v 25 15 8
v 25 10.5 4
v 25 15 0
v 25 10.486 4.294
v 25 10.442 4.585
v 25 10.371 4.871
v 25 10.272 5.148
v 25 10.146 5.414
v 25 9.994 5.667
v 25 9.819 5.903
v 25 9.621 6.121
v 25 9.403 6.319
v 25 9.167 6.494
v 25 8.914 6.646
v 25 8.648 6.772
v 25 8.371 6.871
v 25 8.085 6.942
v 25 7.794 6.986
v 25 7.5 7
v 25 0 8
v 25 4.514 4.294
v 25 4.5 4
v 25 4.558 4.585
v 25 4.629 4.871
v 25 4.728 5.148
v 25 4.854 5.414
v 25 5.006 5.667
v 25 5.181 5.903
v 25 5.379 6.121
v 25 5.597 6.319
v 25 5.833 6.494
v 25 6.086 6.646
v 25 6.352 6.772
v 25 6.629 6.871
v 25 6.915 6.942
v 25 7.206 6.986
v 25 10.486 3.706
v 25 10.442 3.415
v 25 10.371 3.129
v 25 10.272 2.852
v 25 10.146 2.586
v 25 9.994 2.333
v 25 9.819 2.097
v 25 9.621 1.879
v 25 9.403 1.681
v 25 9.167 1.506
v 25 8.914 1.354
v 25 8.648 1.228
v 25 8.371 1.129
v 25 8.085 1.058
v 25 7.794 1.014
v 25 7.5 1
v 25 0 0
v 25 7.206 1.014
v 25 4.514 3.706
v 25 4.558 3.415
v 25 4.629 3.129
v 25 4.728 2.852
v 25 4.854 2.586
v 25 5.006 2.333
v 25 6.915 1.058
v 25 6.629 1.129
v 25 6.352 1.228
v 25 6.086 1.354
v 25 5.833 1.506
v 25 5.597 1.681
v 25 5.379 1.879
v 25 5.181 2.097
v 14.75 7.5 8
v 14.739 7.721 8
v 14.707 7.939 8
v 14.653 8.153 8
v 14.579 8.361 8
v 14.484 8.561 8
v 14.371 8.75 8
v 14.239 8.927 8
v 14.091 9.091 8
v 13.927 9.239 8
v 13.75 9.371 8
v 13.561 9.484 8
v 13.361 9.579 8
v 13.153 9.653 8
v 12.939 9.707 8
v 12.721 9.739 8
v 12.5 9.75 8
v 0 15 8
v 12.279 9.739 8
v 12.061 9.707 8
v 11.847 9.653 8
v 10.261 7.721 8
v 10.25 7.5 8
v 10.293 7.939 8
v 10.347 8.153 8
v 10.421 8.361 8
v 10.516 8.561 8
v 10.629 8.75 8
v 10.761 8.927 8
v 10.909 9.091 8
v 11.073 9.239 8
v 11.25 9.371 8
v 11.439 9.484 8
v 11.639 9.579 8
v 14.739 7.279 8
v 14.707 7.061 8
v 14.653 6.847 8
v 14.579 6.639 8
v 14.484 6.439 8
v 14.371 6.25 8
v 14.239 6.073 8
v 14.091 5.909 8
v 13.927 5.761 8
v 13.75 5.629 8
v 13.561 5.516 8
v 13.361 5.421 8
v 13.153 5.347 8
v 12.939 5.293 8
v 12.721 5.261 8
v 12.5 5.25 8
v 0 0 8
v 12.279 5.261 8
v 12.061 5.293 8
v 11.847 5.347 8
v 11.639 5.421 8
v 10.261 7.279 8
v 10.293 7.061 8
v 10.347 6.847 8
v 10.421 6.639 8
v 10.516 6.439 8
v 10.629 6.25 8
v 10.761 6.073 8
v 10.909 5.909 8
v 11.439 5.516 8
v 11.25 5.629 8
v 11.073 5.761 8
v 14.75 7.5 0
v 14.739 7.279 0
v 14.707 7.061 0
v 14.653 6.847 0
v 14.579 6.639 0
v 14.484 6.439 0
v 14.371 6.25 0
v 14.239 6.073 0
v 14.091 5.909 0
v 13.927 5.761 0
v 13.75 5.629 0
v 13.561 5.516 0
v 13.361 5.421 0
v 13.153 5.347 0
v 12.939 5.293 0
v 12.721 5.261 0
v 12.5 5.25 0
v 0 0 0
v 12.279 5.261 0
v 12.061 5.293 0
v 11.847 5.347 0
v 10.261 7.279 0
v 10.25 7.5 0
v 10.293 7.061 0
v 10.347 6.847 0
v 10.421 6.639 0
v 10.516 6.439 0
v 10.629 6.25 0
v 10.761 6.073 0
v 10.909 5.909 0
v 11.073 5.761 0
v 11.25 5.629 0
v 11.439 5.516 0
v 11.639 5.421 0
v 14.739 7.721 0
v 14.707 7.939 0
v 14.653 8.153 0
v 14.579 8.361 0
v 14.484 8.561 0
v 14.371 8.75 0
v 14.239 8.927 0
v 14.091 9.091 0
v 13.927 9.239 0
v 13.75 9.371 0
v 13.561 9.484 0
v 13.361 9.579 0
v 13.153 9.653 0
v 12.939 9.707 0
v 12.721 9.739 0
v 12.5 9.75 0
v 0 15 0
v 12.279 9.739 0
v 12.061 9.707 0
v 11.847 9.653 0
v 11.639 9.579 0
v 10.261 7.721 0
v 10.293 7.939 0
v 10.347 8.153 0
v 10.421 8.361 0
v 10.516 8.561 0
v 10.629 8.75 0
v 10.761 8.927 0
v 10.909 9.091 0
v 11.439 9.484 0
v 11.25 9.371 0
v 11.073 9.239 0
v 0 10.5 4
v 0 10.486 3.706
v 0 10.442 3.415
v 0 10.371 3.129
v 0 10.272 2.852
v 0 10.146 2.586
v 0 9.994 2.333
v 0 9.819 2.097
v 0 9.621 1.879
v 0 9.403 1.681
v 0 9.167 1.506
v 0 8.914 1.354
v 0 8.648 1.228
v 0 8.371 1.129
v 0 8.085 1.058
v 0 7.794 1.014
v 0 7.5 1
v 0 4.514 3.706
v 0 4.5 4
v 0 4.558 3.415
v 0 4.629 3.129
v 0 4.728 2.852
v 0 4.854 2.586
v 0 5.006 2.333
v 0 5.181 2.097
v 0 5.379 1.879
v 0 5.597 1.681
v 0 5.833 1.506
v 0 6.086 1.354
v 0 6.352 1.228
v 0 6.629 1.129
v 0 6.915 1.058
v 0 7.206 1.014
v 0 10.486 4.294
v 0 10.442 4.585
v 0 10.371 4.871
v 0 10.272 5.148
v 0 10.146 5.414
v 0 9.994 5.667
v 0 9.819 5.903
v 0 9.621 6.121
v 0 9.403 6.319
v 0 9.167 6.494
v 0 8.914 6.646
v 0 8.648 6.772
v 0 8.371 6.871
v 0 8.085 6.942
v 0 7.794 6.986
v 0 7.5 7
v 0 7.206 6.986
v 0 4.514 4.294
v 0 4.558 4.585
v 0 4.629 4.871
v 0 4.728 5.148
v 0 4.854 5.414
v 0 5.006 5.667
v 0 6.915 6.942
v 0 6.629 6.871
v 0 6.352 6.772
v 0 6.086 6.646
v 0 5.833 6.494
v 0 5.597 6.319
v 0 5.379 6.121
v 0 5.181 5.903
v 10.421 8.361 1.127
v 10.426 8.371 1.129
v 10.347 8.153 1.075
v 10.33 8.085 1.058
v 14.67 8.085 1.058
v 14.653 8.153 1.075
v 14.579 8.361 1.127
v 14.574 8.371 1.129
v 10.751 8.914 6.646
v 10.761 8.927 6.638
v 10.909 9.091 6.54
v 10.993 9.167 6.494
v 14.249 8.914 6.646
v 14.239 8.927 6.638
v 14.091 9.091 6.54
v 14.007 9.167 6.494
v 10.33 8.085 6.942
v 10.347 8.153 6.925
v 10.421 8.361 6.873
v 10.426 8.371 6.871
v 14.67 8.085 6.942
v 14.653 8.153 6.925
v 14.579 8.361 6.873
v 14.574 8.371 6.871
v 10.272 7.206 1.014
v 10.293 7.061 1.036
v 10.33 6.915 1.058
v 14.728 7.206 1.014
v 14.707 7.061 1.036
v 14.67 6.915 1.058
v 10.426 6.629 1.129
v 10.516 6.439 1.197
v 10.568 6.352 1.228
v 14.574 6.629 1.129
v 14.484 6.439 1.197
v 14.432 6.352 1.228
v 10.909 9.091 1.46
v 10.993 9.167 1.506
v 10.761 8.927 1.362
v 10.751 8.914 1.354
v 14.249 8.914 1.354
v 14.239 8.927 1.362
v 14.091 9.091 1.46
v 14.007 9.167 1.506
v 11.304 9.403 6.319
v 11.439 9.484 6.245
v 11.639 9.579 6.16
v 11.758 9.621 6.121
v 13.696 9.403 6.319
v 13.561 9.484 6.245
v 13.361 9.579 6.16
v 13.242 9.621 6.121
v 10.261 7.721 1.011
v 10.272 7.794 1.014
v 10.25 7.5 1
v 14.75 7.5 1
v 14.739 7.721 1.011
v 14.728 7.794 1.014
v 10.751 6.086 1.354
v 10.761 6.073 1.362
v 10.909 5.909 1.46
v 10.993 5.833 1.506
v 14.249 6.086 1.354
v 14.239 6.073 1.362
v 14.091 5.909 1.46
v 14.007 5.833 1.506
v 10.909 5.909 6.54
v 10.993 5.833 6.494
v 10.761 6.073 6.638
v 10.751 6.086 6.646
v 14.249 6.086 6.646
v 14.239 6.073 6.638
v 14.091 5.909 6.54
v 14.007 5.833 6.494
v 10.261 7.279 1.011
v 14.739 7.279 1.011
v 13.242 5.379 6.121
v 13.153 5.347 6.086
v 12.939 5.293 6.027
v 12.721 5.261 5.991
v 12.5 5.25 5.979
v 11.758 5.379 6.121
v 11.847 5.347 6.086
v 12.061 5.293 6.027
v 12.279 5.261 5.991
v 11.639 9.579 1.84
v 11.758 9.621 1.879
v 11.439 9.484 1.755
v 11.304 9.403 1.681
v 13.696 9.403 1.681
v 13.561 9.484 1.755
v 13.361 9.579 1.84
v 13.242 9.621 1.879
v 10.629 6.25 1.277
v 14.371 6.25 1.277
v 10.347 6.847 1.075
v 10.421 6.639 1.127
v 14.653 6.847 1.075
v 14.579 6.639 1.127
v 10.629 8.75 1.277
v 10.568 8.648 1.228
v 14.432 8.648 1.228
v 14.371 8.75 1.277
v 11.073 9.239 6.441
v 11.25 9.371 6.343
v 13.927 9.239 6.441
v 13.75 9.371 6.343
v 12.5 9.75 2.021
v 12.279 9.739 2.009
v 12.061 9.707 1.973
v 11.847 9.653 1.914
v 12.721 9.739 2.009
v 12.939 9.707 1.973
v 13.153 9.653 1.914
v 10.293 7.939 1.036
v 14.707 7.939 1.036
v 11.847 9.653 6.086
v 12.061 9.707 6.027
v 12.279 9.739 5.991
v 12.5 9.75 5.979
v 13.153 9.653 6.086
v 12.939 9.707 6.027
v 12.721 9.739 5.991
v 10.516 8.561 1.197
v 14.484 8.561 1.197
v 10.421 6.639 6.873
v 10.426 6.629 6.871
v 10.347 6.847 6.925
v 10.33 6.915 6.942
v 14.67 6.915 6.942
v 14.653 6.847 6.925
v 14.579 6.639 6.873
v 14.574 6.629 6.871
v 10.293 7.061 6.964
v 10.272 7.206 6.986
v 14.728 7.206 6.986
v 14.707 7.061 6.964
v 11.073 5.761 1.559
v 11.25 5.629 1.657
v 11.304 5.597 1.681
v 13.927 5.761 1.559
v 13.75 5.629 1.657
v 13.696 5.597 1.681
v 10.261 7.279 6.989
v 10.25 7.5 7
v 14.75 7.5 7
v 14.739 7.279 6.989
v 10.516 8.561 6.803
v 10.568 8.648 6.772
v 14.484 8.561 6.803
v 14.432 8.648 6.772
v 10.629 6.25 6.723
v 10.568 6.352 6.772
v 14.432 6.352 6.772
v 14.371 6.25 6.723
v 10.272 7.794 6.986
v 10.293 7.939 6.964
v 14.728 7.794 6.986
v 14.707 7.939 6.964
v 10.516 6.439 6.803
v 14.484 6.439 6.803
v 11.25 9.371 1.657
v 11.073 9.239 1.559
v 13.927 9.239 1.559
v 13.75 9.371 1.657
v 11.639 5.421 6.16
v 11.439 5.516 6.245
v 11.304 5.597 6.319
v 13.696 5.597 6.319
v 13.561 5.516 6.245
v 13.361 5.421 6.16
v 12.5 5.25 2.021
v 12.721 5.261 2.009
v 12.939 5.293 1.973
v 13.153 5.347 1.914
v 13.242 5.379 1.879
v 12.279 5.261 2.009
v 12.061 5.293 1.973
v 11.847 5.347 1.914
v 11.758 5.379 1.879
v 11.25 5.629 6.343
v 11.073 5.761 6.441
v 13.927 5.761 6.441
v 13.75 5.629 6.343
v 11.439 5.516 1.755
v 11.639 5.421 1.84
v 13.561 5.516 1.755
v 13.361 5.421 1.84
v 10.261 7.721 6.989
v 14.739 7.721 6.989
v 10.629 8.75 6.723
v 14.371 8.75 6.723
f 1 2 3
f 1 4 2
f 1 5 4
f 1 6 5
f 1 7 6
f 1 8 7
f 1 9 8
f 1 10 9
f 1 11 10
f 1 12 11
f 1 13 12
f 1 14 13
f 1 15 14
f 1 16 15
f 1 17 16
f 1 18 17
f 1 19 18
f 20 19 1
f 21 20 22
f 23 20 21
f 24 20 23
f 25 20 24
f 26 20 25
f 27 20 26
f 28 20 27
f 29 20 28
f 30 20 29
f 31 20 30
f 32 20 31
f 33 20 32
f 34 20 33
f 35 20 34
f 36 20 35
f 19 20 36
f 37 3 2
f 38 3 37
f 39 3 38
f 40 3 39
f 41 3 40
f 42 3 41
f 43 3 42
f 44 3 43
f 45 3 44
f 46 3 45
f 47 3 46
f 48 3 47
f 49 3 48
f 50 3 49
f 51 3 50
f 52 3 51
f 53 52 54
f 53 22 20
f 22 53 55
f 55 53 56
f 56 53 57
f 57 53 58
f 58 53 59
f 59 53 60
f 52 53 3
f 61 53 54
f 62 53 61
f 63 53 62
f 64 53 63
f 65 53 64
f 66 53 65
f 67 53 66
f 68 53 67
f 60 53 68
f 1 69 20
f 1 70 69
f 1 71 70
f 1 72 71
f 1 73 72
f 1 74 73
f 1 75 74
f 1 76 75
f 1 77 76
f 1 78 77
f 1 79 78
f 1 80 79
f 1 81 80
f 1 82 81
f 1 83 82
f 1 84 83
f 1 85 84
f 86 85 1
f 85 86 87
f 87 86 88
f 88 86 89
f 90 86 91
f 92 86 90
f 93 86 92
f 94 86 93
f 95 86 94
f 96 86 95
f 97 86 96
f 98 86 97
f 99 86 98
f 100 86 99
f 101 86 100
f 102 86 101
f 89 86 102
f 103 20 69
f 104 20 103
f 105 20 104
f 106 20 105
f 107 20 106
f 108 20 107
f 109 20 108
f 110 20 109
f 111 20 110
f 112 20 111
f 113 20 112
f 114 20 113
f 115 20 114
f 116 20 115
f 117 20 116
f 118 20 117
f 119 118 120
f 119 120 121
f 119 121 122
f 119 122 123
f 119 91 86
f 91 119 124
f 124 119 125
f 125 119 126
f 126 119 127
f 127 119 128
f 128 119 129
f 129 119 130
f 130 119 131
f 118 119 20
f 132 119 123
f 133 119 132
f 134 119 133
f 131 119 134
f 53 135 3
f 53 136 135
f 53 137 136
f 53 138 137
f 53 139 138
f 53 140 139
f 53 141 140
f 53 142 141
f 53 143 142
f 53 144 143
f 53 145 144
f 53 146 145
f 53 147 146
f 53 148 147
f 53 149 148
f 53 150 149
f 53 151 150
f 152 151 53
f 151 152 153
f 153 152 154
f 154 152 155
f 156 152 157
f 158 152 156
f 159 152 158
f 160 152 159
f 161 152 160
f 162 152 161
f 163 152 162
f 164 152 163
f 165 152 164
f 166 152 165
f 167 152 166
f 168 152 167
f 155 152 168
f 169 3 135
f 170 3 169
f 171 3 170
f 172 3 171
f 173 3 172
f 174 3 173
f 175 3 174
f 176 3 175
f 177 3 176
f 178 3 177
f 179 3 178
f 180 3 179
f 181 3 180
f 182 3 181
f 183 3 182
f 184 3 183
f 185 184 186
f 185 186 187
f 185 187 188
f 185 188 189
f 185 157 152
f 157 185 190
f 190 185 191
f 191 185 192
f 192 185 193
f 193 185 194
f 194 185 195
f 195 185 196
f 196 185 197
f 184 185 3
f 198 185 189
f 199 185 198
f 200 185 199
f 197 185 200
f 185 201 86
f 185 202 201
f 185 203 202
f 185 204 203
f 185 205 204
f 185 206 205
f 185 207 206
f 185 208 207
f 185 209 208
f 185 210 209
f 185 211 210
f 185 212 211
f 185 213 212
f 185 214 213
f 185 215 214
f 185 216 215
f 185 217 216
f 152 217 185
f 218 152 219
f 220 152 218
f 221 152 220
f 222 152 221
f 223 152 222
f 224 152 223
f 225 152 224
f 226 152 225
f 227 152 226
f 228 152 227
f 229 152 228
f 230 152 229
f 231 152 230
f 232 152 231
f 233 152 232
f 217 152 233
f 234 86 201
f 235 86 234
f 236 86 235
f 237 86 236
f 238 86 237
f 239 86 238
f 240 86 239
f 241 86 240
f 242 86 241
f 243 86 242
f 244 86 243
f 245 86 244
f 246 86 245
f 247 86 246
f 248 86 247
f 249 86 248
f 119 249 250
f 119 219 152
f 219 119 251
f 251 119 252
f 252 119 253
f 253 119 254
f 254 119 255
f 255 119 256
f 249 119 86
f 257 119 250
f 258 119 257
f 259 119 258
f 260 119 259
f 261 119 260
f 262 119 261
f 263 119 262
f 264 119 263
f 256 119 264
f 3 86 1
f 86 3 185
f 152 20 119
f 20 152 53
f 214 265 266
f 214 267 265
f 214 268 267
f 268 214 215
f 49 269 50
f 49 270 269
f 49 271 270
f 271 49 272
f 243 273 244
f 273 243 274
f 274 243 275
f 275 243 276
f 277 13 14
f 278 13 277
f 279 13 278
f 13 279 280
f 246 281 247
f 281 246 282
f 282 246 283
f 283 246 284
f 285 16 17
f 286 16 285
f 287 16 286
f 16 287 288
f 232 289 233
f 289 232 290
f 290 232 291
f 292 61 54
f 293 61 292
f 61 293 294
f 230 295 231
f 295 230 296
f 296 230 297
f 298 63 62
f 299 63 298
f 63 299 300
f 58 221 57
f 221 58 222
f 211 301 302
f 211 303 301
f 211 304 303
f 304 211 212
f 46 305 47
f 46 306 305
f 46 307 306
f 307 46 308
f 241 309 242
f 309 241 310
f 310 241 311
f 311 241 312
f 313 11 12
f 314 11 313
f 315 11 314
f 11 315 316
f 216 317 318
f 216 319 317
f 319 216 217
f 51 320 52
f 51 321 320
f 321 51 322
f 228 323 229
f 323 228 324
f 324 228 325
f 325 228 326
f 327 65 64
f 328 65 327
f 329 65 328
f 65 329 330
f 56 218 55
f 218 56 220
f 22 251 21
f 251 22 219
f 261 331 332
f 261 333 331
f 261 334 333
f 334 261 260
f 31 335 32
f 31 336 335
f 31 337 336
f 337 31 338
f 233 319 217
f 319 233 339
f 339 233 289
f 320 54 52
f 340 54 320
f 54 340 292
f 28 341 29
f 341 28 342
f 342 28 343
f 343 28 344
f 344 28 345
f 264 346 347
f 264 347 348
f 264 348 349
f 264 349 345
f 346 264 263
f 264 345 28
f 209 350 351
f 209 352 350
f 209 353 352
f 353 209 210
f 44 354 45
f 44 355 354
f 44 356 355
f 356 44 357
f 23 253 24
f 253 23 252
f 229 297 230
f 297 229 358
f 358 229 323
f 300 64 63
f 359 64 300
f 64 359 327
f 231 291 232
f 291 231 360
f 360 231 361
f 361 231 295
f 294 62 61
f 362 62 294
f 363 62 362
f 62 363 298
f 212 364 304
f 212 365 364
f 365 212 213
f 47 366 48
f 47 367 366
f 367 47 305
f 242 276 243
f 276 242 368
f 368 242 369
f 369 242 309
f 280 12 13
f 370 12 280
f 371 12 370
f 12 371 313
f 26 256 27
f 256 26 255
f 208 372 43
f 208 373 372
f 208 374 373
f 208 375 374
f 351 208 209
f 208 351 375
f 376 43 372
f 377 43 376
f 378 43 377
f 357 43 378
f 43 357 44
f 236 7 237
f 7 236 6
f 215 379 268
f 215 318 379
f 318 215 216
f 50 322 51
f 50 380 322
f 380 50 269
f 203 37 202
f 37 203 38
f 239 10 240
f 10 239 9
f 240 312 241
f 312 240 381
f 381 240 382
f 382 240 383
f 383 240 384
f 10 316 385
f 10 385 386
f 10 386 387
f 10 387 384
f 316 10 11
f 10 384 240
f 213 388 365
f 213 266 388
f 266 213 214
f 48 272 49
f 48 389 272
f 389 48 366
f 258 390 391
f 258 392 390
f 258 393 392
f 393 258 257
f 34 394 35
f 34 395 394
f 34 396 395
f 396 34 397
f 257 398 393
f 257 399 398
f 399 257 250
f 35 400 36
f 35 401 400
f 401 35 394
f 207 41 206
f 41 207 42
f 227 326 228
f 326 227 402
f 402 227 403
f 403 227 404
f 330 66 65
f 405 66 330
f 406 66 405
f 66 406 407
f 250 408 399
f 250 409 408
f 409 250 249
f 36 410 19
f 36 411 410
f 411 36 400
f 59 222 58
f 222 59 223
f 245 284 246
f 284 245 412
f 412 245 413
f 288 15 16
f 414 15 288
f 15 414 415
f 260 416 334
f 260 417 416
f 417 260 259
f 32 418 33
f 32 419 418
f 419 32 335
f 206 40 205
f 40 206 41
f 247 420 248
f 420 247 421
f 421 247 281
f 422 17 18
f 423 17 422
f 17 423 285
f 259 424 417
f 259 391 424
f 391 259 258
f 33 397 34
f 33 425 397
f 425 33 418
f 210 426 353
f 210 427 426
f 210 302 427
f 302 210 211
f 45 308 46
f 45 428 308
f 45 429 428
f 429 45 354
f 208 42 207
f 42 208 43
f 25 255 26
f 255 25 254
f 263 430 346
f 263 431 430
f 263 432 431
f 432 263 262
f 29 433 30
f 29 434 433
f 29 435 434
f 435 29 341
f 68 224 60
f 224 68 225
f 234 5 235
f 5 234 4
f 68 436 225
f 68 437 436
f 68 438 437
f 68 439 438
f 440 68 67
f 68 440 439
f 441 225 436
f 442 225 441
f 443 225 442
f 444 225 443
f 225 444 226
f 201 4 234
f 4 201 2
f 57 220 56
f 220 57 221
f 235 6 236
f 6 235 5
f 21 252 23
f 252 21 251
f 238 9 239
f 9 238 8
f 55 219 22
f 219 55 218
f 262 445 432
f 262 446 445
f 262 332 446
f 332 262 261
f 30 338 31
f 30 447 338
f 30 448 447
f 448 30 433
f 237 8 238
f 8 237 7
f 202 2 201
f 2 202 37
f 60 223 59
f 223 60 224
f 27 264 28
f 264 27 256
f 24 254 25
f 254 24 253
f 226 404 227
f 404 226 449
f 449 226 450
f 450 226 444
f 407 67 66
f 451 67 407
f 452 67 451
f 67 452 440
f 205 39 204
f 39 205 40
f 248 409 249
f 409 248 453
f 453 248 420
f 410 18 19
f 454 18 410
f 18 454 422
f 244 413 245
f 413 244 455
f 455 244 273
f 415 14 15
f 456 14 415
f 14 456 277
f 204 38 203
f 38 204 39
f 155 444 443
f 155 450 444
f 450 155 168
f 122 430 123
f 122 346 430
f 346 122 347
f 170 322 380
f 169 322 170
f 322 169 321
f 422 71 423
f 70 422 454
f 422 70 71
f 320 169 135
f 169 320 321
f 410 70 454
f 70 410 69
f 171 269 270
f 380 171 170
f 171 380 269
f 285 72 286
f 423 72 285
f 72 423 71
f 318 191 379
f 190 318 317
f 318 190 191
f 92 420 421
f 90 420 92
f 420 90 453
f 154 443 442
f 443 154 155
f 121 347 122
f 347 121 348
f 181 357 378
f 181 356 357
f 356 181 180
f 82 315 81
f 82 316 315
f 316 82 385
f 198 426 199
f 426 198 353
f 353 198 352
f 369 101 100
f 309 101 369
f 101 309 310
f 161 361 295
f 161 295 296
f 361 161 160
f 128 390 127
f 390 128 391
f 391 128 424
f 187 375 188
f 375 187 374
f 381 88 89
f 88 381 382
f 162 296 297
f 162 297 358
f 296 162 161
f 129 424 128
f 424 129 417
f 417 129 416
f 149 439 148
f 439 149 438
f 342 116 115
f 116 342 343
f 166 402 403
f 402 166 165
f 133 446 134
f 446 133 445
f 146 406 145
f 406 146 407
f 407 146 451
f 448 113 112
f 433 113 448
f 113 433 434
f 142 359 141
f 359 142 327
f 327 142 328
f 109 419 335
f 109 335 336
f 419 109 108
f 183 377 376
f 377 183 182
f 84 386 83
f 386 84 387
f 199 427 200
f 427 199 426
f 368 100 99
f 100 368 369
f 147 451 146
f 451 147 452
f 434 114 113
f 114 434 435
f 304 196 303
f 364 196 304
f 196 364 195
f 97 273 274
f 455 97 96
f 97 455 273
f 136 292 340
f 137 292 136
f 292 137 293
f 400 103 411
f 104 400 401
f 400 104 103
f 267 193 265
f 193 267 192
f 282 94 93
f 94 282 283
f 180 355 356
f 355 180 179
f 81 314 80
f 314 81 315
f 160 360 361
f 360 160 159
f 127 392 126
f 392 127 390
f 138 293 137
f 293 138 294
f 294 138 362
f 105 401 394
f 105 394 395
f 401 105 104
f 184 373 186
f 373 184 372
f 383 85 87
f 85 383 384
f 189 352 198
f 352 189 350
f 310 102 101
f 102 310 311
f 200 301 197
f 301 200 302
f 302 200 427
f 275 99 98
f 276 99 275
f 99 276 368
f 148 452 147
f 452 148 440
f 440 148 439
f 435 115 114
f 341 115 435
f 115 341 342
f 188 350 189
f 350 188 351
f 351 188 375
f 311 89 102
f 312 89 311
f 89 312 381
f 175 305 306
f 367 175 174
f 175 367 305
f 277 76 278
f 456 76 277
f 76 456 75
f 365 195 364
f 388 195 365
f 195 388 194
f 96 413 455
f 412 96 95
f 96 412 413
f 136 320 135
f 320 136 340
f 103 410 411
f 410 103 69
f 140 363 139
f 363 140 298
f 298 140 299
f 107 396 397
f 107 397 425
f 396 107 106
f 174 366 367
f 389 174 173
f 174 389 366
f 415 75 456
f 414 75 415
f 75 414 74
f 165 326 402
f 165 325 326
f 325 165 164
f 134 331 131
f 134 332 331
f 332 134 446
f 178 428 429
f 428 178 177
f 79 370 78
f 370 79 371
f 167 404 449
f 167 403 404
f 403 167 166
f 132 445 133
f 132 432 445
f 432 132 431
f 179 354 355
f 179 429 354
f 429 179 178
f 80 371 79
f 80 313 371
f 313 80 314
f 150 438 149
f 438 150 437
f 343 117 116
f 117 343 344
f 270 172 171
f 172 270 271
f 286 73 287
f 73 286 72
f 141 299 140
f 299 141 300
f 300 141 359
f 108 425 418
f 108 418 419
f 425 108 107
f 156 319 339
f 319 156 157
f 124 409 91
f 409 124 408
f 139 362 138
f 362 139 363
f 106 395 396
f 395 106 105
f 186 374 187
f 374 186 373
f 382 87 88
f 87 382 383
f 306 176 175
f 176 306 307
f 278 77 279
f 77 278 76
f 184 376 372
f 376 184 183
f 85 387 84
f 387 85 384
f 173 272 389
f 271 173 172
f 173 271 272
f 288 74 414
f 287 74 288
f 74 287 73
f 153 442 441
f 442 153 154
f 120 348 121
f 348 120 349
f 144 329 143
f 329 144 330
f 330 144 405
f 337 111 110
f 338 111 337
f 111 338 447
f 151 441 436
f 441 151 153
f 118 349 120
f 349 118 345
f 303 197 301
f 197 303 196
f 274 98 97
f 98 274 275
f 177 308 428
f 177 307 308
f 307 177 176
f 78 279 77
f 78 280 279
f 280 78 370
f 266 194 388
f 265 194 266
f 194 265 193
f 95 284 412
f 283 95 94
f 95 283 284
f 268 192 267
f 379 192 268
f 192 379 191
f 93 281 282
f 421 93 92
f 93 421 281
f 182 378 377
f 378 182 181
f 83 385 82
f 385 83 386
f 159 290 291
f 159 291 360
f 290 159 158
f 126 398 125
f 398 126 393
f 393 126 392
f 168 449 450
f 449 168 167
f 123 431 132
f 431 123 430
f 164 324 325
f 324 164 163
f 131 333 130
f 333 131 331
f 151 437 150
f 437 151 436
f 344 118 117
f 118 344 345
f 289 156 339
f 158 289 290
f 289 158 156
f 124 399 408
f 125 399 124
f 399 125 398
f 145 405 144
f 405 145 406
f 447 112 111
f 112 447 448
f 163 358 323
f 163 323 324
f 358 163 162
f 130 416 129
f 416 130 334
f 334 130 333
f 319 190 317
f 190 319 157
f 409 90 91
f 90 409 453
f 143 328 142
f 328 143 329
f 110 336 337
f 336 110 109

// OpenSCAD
// file: ../../config.scad
// Ebike Configuration
// All dimensions in mm

// =============================================================================
// RIDER PARAMETERS
// =============================================================================
rider_height = 173;
rider_weight = 55;

// =============================================================================
// FRAME GEOMETRY
// =============================================================================
frame_size = 520;                    // Seat tube center-to-top
top_tube_effective = 545;
head_tube_length = 140;
head_tube_angle = 70;
seat_tube_angle = 72;
chainstay_length = 460;
bb_drop = 65;
wheelbase = 1080;
standover_height = 450;              // Step-through
stack = 620;
reach = 370;

// =============================================================================
// TUBE DIAMETERS
// =============================================================================
head_tube_id = 44;                   // 1-1/8" straight steerer
head_tube_od = 49;
seat_tube_id = 27.2;                 // Standard seatpost
down_tube_od = 44;
top_tube_od = 32;
seat_stay_od = 16;
chainstay_od = 22;

// =============================================================================
// MOTOR CONFIGURATION
// =============================================================================
motor_type = "mid-drive";
bb_shell_width = 68;                 // BSA standard
bb_clearance_width = 120;

// =============================================================================
// DROPOUT PARAMETERS
// =============================================================================
dropout_material = "6061-T6";
dropout_thickness = 10;
dropout_width = 45;
dropout_height = 80;
dropout_axle_spacing = 142;          // Boost thru-axle
dropout_axle_diameter = 12;

// =============================================================================
// BOTTOM BRACKET SHELL
// =============================================================================
bb_shell_od = 42;
bb_shell_id = 34.8;                  // BSA threaded
bb_thread_tpi = 24;                  // BSA 1.37" x 24 TPI

// =============================================================================
// HEAD TUBE
// =============================================================================
// Uses head_tube_length, head_tube_id, head_tube_od from above

// =============================================================================
// SEAT COLLAR
// =============================================================================
seat_collar_id = 31.8;               // For 27.2mm post with shim
seat_collar_od = 38;
seat_collar_height = 25;

// =============================================================================
// MOTOR MOUNT
// =============================================================================
motor_mount_thickness = 8;
motor_mount_width = 120;
motor_mount_height = 100;

// =============================================================================
// BATTERY MOUNT
// =============================================================================
battery_mount_thickness = 6;
battery_mount_width = 60;
battery_mount_height = 40;
battery_mount_quantity = 4;

// =============================================================================
// BRAKE MOUNT (Post Mount)
// =============================================================================
brake_mount_thickness = 10;
brake_mount_width = 80;
brake_mount_height = 50;
brake_post_bolt_spacing = 74;        // Post mount standard
brake_rotor_size_front = 180;
brake_rotor_size_rear = 160;

// =============================================================================
// CABLE GUIDES
// =============================================================================
cable_guide_length = 25;
cable_guide_width = 15;
cable_guide_height = 8;
cable_guide_quantity = 6;

// =============================================================================
// HEADSET CUPS
// =============================================================================
headset_cup_od = 44;
headset_bearing_seat = 30;

// =============================================================================
// RACK/FENDER MOUNTS
// =============================================================================
rack_mount_length = 30;
rack_mount_width = 20;
rack_mount_height = 10;
rack_mount_thread = 5;               // M5
rack_mount_quantity = 4;

// =============================================================================
// GUSSET PLATES
// =============================================================================
gusset_thickness = 6;
gusset_width = 80;
gusset_height = 60;
gusset_quantity = 2;

// =============================================================================
// COMPOSITE FRAME TUBES (FibreSeeker 3)
// =============================================================================
// Wall thickness for carbon fiber reinforced tubes
tube_wall_thickness = 3;

// Down tube (curved for step-through)
down_tube_length = 650;              // Along curve
down_tube_curve_radius = 800;        // Radius of curve

// Seat tube
seat_tube_length = 520;              // frame_size
seat_tube_od = 34;                   // Outer diameter

// Chainstays
chainstay_wall = 2.5;

// Seat stays
seat_stay_length = 480;
seat_stay_wall = 2;

// =============================================================================
// TUBE SECTIONING (for build volume constraints)
// =============================================================================
// Joint design: internal aluminum sleeve with M6 through-bolts
joint_overlap = 30;                  // Overlap length per joint
joint_bolt_diameter = 6;             // M6 bolts
joint_bolt_count = 2;                // Bolts per joint

// Section counts
down_tube_sections = 3;
seat_tube_sections = 2;
chainstay_sections = 2;
seat_stay_sections = 2;

// Sleeve parameters (CNC milled aluminum)
sleeve_wall_thickness = 2;
sleeve_length = 60;                  // Total sleeve length (2x overlap)

// =============================================================================
// MANUFACTURING TOLERANCES
// =============================================================================
tolerance_press_fit = 0.05;
tolerance_general = 0.1;

// =============================================================================
// COMMON CONSTANTS
// =============================================================================
$fn = 64;                            // Circle resolution
epsilon = 0.01;                      // For boolean operations
// main file
// Cable Guide
// CNC milled component for NestWorks C500

include <../../config.scad>

module cable_guide() {
    difference() {
        // Main body
        cube([cable_guide_length, cable_guide_width, cable_guide_height]);

        // Cable channel
        translate([-epsilon, cable_guide_width/2, cable_guide_height/2])
            rotate([0, 90, 0])
                cylinder(h = cable_guide_length + 2*epsilon, d = 6);

        // Mounting hole (M4)
        translate([cable_guide_length/2, cable_guide_width/2, -epsilon])
            cylinder(h = cable_guide_height + 2*epsilon, d = 4.5);
    }
}

// Render for preview
cable_guide();
